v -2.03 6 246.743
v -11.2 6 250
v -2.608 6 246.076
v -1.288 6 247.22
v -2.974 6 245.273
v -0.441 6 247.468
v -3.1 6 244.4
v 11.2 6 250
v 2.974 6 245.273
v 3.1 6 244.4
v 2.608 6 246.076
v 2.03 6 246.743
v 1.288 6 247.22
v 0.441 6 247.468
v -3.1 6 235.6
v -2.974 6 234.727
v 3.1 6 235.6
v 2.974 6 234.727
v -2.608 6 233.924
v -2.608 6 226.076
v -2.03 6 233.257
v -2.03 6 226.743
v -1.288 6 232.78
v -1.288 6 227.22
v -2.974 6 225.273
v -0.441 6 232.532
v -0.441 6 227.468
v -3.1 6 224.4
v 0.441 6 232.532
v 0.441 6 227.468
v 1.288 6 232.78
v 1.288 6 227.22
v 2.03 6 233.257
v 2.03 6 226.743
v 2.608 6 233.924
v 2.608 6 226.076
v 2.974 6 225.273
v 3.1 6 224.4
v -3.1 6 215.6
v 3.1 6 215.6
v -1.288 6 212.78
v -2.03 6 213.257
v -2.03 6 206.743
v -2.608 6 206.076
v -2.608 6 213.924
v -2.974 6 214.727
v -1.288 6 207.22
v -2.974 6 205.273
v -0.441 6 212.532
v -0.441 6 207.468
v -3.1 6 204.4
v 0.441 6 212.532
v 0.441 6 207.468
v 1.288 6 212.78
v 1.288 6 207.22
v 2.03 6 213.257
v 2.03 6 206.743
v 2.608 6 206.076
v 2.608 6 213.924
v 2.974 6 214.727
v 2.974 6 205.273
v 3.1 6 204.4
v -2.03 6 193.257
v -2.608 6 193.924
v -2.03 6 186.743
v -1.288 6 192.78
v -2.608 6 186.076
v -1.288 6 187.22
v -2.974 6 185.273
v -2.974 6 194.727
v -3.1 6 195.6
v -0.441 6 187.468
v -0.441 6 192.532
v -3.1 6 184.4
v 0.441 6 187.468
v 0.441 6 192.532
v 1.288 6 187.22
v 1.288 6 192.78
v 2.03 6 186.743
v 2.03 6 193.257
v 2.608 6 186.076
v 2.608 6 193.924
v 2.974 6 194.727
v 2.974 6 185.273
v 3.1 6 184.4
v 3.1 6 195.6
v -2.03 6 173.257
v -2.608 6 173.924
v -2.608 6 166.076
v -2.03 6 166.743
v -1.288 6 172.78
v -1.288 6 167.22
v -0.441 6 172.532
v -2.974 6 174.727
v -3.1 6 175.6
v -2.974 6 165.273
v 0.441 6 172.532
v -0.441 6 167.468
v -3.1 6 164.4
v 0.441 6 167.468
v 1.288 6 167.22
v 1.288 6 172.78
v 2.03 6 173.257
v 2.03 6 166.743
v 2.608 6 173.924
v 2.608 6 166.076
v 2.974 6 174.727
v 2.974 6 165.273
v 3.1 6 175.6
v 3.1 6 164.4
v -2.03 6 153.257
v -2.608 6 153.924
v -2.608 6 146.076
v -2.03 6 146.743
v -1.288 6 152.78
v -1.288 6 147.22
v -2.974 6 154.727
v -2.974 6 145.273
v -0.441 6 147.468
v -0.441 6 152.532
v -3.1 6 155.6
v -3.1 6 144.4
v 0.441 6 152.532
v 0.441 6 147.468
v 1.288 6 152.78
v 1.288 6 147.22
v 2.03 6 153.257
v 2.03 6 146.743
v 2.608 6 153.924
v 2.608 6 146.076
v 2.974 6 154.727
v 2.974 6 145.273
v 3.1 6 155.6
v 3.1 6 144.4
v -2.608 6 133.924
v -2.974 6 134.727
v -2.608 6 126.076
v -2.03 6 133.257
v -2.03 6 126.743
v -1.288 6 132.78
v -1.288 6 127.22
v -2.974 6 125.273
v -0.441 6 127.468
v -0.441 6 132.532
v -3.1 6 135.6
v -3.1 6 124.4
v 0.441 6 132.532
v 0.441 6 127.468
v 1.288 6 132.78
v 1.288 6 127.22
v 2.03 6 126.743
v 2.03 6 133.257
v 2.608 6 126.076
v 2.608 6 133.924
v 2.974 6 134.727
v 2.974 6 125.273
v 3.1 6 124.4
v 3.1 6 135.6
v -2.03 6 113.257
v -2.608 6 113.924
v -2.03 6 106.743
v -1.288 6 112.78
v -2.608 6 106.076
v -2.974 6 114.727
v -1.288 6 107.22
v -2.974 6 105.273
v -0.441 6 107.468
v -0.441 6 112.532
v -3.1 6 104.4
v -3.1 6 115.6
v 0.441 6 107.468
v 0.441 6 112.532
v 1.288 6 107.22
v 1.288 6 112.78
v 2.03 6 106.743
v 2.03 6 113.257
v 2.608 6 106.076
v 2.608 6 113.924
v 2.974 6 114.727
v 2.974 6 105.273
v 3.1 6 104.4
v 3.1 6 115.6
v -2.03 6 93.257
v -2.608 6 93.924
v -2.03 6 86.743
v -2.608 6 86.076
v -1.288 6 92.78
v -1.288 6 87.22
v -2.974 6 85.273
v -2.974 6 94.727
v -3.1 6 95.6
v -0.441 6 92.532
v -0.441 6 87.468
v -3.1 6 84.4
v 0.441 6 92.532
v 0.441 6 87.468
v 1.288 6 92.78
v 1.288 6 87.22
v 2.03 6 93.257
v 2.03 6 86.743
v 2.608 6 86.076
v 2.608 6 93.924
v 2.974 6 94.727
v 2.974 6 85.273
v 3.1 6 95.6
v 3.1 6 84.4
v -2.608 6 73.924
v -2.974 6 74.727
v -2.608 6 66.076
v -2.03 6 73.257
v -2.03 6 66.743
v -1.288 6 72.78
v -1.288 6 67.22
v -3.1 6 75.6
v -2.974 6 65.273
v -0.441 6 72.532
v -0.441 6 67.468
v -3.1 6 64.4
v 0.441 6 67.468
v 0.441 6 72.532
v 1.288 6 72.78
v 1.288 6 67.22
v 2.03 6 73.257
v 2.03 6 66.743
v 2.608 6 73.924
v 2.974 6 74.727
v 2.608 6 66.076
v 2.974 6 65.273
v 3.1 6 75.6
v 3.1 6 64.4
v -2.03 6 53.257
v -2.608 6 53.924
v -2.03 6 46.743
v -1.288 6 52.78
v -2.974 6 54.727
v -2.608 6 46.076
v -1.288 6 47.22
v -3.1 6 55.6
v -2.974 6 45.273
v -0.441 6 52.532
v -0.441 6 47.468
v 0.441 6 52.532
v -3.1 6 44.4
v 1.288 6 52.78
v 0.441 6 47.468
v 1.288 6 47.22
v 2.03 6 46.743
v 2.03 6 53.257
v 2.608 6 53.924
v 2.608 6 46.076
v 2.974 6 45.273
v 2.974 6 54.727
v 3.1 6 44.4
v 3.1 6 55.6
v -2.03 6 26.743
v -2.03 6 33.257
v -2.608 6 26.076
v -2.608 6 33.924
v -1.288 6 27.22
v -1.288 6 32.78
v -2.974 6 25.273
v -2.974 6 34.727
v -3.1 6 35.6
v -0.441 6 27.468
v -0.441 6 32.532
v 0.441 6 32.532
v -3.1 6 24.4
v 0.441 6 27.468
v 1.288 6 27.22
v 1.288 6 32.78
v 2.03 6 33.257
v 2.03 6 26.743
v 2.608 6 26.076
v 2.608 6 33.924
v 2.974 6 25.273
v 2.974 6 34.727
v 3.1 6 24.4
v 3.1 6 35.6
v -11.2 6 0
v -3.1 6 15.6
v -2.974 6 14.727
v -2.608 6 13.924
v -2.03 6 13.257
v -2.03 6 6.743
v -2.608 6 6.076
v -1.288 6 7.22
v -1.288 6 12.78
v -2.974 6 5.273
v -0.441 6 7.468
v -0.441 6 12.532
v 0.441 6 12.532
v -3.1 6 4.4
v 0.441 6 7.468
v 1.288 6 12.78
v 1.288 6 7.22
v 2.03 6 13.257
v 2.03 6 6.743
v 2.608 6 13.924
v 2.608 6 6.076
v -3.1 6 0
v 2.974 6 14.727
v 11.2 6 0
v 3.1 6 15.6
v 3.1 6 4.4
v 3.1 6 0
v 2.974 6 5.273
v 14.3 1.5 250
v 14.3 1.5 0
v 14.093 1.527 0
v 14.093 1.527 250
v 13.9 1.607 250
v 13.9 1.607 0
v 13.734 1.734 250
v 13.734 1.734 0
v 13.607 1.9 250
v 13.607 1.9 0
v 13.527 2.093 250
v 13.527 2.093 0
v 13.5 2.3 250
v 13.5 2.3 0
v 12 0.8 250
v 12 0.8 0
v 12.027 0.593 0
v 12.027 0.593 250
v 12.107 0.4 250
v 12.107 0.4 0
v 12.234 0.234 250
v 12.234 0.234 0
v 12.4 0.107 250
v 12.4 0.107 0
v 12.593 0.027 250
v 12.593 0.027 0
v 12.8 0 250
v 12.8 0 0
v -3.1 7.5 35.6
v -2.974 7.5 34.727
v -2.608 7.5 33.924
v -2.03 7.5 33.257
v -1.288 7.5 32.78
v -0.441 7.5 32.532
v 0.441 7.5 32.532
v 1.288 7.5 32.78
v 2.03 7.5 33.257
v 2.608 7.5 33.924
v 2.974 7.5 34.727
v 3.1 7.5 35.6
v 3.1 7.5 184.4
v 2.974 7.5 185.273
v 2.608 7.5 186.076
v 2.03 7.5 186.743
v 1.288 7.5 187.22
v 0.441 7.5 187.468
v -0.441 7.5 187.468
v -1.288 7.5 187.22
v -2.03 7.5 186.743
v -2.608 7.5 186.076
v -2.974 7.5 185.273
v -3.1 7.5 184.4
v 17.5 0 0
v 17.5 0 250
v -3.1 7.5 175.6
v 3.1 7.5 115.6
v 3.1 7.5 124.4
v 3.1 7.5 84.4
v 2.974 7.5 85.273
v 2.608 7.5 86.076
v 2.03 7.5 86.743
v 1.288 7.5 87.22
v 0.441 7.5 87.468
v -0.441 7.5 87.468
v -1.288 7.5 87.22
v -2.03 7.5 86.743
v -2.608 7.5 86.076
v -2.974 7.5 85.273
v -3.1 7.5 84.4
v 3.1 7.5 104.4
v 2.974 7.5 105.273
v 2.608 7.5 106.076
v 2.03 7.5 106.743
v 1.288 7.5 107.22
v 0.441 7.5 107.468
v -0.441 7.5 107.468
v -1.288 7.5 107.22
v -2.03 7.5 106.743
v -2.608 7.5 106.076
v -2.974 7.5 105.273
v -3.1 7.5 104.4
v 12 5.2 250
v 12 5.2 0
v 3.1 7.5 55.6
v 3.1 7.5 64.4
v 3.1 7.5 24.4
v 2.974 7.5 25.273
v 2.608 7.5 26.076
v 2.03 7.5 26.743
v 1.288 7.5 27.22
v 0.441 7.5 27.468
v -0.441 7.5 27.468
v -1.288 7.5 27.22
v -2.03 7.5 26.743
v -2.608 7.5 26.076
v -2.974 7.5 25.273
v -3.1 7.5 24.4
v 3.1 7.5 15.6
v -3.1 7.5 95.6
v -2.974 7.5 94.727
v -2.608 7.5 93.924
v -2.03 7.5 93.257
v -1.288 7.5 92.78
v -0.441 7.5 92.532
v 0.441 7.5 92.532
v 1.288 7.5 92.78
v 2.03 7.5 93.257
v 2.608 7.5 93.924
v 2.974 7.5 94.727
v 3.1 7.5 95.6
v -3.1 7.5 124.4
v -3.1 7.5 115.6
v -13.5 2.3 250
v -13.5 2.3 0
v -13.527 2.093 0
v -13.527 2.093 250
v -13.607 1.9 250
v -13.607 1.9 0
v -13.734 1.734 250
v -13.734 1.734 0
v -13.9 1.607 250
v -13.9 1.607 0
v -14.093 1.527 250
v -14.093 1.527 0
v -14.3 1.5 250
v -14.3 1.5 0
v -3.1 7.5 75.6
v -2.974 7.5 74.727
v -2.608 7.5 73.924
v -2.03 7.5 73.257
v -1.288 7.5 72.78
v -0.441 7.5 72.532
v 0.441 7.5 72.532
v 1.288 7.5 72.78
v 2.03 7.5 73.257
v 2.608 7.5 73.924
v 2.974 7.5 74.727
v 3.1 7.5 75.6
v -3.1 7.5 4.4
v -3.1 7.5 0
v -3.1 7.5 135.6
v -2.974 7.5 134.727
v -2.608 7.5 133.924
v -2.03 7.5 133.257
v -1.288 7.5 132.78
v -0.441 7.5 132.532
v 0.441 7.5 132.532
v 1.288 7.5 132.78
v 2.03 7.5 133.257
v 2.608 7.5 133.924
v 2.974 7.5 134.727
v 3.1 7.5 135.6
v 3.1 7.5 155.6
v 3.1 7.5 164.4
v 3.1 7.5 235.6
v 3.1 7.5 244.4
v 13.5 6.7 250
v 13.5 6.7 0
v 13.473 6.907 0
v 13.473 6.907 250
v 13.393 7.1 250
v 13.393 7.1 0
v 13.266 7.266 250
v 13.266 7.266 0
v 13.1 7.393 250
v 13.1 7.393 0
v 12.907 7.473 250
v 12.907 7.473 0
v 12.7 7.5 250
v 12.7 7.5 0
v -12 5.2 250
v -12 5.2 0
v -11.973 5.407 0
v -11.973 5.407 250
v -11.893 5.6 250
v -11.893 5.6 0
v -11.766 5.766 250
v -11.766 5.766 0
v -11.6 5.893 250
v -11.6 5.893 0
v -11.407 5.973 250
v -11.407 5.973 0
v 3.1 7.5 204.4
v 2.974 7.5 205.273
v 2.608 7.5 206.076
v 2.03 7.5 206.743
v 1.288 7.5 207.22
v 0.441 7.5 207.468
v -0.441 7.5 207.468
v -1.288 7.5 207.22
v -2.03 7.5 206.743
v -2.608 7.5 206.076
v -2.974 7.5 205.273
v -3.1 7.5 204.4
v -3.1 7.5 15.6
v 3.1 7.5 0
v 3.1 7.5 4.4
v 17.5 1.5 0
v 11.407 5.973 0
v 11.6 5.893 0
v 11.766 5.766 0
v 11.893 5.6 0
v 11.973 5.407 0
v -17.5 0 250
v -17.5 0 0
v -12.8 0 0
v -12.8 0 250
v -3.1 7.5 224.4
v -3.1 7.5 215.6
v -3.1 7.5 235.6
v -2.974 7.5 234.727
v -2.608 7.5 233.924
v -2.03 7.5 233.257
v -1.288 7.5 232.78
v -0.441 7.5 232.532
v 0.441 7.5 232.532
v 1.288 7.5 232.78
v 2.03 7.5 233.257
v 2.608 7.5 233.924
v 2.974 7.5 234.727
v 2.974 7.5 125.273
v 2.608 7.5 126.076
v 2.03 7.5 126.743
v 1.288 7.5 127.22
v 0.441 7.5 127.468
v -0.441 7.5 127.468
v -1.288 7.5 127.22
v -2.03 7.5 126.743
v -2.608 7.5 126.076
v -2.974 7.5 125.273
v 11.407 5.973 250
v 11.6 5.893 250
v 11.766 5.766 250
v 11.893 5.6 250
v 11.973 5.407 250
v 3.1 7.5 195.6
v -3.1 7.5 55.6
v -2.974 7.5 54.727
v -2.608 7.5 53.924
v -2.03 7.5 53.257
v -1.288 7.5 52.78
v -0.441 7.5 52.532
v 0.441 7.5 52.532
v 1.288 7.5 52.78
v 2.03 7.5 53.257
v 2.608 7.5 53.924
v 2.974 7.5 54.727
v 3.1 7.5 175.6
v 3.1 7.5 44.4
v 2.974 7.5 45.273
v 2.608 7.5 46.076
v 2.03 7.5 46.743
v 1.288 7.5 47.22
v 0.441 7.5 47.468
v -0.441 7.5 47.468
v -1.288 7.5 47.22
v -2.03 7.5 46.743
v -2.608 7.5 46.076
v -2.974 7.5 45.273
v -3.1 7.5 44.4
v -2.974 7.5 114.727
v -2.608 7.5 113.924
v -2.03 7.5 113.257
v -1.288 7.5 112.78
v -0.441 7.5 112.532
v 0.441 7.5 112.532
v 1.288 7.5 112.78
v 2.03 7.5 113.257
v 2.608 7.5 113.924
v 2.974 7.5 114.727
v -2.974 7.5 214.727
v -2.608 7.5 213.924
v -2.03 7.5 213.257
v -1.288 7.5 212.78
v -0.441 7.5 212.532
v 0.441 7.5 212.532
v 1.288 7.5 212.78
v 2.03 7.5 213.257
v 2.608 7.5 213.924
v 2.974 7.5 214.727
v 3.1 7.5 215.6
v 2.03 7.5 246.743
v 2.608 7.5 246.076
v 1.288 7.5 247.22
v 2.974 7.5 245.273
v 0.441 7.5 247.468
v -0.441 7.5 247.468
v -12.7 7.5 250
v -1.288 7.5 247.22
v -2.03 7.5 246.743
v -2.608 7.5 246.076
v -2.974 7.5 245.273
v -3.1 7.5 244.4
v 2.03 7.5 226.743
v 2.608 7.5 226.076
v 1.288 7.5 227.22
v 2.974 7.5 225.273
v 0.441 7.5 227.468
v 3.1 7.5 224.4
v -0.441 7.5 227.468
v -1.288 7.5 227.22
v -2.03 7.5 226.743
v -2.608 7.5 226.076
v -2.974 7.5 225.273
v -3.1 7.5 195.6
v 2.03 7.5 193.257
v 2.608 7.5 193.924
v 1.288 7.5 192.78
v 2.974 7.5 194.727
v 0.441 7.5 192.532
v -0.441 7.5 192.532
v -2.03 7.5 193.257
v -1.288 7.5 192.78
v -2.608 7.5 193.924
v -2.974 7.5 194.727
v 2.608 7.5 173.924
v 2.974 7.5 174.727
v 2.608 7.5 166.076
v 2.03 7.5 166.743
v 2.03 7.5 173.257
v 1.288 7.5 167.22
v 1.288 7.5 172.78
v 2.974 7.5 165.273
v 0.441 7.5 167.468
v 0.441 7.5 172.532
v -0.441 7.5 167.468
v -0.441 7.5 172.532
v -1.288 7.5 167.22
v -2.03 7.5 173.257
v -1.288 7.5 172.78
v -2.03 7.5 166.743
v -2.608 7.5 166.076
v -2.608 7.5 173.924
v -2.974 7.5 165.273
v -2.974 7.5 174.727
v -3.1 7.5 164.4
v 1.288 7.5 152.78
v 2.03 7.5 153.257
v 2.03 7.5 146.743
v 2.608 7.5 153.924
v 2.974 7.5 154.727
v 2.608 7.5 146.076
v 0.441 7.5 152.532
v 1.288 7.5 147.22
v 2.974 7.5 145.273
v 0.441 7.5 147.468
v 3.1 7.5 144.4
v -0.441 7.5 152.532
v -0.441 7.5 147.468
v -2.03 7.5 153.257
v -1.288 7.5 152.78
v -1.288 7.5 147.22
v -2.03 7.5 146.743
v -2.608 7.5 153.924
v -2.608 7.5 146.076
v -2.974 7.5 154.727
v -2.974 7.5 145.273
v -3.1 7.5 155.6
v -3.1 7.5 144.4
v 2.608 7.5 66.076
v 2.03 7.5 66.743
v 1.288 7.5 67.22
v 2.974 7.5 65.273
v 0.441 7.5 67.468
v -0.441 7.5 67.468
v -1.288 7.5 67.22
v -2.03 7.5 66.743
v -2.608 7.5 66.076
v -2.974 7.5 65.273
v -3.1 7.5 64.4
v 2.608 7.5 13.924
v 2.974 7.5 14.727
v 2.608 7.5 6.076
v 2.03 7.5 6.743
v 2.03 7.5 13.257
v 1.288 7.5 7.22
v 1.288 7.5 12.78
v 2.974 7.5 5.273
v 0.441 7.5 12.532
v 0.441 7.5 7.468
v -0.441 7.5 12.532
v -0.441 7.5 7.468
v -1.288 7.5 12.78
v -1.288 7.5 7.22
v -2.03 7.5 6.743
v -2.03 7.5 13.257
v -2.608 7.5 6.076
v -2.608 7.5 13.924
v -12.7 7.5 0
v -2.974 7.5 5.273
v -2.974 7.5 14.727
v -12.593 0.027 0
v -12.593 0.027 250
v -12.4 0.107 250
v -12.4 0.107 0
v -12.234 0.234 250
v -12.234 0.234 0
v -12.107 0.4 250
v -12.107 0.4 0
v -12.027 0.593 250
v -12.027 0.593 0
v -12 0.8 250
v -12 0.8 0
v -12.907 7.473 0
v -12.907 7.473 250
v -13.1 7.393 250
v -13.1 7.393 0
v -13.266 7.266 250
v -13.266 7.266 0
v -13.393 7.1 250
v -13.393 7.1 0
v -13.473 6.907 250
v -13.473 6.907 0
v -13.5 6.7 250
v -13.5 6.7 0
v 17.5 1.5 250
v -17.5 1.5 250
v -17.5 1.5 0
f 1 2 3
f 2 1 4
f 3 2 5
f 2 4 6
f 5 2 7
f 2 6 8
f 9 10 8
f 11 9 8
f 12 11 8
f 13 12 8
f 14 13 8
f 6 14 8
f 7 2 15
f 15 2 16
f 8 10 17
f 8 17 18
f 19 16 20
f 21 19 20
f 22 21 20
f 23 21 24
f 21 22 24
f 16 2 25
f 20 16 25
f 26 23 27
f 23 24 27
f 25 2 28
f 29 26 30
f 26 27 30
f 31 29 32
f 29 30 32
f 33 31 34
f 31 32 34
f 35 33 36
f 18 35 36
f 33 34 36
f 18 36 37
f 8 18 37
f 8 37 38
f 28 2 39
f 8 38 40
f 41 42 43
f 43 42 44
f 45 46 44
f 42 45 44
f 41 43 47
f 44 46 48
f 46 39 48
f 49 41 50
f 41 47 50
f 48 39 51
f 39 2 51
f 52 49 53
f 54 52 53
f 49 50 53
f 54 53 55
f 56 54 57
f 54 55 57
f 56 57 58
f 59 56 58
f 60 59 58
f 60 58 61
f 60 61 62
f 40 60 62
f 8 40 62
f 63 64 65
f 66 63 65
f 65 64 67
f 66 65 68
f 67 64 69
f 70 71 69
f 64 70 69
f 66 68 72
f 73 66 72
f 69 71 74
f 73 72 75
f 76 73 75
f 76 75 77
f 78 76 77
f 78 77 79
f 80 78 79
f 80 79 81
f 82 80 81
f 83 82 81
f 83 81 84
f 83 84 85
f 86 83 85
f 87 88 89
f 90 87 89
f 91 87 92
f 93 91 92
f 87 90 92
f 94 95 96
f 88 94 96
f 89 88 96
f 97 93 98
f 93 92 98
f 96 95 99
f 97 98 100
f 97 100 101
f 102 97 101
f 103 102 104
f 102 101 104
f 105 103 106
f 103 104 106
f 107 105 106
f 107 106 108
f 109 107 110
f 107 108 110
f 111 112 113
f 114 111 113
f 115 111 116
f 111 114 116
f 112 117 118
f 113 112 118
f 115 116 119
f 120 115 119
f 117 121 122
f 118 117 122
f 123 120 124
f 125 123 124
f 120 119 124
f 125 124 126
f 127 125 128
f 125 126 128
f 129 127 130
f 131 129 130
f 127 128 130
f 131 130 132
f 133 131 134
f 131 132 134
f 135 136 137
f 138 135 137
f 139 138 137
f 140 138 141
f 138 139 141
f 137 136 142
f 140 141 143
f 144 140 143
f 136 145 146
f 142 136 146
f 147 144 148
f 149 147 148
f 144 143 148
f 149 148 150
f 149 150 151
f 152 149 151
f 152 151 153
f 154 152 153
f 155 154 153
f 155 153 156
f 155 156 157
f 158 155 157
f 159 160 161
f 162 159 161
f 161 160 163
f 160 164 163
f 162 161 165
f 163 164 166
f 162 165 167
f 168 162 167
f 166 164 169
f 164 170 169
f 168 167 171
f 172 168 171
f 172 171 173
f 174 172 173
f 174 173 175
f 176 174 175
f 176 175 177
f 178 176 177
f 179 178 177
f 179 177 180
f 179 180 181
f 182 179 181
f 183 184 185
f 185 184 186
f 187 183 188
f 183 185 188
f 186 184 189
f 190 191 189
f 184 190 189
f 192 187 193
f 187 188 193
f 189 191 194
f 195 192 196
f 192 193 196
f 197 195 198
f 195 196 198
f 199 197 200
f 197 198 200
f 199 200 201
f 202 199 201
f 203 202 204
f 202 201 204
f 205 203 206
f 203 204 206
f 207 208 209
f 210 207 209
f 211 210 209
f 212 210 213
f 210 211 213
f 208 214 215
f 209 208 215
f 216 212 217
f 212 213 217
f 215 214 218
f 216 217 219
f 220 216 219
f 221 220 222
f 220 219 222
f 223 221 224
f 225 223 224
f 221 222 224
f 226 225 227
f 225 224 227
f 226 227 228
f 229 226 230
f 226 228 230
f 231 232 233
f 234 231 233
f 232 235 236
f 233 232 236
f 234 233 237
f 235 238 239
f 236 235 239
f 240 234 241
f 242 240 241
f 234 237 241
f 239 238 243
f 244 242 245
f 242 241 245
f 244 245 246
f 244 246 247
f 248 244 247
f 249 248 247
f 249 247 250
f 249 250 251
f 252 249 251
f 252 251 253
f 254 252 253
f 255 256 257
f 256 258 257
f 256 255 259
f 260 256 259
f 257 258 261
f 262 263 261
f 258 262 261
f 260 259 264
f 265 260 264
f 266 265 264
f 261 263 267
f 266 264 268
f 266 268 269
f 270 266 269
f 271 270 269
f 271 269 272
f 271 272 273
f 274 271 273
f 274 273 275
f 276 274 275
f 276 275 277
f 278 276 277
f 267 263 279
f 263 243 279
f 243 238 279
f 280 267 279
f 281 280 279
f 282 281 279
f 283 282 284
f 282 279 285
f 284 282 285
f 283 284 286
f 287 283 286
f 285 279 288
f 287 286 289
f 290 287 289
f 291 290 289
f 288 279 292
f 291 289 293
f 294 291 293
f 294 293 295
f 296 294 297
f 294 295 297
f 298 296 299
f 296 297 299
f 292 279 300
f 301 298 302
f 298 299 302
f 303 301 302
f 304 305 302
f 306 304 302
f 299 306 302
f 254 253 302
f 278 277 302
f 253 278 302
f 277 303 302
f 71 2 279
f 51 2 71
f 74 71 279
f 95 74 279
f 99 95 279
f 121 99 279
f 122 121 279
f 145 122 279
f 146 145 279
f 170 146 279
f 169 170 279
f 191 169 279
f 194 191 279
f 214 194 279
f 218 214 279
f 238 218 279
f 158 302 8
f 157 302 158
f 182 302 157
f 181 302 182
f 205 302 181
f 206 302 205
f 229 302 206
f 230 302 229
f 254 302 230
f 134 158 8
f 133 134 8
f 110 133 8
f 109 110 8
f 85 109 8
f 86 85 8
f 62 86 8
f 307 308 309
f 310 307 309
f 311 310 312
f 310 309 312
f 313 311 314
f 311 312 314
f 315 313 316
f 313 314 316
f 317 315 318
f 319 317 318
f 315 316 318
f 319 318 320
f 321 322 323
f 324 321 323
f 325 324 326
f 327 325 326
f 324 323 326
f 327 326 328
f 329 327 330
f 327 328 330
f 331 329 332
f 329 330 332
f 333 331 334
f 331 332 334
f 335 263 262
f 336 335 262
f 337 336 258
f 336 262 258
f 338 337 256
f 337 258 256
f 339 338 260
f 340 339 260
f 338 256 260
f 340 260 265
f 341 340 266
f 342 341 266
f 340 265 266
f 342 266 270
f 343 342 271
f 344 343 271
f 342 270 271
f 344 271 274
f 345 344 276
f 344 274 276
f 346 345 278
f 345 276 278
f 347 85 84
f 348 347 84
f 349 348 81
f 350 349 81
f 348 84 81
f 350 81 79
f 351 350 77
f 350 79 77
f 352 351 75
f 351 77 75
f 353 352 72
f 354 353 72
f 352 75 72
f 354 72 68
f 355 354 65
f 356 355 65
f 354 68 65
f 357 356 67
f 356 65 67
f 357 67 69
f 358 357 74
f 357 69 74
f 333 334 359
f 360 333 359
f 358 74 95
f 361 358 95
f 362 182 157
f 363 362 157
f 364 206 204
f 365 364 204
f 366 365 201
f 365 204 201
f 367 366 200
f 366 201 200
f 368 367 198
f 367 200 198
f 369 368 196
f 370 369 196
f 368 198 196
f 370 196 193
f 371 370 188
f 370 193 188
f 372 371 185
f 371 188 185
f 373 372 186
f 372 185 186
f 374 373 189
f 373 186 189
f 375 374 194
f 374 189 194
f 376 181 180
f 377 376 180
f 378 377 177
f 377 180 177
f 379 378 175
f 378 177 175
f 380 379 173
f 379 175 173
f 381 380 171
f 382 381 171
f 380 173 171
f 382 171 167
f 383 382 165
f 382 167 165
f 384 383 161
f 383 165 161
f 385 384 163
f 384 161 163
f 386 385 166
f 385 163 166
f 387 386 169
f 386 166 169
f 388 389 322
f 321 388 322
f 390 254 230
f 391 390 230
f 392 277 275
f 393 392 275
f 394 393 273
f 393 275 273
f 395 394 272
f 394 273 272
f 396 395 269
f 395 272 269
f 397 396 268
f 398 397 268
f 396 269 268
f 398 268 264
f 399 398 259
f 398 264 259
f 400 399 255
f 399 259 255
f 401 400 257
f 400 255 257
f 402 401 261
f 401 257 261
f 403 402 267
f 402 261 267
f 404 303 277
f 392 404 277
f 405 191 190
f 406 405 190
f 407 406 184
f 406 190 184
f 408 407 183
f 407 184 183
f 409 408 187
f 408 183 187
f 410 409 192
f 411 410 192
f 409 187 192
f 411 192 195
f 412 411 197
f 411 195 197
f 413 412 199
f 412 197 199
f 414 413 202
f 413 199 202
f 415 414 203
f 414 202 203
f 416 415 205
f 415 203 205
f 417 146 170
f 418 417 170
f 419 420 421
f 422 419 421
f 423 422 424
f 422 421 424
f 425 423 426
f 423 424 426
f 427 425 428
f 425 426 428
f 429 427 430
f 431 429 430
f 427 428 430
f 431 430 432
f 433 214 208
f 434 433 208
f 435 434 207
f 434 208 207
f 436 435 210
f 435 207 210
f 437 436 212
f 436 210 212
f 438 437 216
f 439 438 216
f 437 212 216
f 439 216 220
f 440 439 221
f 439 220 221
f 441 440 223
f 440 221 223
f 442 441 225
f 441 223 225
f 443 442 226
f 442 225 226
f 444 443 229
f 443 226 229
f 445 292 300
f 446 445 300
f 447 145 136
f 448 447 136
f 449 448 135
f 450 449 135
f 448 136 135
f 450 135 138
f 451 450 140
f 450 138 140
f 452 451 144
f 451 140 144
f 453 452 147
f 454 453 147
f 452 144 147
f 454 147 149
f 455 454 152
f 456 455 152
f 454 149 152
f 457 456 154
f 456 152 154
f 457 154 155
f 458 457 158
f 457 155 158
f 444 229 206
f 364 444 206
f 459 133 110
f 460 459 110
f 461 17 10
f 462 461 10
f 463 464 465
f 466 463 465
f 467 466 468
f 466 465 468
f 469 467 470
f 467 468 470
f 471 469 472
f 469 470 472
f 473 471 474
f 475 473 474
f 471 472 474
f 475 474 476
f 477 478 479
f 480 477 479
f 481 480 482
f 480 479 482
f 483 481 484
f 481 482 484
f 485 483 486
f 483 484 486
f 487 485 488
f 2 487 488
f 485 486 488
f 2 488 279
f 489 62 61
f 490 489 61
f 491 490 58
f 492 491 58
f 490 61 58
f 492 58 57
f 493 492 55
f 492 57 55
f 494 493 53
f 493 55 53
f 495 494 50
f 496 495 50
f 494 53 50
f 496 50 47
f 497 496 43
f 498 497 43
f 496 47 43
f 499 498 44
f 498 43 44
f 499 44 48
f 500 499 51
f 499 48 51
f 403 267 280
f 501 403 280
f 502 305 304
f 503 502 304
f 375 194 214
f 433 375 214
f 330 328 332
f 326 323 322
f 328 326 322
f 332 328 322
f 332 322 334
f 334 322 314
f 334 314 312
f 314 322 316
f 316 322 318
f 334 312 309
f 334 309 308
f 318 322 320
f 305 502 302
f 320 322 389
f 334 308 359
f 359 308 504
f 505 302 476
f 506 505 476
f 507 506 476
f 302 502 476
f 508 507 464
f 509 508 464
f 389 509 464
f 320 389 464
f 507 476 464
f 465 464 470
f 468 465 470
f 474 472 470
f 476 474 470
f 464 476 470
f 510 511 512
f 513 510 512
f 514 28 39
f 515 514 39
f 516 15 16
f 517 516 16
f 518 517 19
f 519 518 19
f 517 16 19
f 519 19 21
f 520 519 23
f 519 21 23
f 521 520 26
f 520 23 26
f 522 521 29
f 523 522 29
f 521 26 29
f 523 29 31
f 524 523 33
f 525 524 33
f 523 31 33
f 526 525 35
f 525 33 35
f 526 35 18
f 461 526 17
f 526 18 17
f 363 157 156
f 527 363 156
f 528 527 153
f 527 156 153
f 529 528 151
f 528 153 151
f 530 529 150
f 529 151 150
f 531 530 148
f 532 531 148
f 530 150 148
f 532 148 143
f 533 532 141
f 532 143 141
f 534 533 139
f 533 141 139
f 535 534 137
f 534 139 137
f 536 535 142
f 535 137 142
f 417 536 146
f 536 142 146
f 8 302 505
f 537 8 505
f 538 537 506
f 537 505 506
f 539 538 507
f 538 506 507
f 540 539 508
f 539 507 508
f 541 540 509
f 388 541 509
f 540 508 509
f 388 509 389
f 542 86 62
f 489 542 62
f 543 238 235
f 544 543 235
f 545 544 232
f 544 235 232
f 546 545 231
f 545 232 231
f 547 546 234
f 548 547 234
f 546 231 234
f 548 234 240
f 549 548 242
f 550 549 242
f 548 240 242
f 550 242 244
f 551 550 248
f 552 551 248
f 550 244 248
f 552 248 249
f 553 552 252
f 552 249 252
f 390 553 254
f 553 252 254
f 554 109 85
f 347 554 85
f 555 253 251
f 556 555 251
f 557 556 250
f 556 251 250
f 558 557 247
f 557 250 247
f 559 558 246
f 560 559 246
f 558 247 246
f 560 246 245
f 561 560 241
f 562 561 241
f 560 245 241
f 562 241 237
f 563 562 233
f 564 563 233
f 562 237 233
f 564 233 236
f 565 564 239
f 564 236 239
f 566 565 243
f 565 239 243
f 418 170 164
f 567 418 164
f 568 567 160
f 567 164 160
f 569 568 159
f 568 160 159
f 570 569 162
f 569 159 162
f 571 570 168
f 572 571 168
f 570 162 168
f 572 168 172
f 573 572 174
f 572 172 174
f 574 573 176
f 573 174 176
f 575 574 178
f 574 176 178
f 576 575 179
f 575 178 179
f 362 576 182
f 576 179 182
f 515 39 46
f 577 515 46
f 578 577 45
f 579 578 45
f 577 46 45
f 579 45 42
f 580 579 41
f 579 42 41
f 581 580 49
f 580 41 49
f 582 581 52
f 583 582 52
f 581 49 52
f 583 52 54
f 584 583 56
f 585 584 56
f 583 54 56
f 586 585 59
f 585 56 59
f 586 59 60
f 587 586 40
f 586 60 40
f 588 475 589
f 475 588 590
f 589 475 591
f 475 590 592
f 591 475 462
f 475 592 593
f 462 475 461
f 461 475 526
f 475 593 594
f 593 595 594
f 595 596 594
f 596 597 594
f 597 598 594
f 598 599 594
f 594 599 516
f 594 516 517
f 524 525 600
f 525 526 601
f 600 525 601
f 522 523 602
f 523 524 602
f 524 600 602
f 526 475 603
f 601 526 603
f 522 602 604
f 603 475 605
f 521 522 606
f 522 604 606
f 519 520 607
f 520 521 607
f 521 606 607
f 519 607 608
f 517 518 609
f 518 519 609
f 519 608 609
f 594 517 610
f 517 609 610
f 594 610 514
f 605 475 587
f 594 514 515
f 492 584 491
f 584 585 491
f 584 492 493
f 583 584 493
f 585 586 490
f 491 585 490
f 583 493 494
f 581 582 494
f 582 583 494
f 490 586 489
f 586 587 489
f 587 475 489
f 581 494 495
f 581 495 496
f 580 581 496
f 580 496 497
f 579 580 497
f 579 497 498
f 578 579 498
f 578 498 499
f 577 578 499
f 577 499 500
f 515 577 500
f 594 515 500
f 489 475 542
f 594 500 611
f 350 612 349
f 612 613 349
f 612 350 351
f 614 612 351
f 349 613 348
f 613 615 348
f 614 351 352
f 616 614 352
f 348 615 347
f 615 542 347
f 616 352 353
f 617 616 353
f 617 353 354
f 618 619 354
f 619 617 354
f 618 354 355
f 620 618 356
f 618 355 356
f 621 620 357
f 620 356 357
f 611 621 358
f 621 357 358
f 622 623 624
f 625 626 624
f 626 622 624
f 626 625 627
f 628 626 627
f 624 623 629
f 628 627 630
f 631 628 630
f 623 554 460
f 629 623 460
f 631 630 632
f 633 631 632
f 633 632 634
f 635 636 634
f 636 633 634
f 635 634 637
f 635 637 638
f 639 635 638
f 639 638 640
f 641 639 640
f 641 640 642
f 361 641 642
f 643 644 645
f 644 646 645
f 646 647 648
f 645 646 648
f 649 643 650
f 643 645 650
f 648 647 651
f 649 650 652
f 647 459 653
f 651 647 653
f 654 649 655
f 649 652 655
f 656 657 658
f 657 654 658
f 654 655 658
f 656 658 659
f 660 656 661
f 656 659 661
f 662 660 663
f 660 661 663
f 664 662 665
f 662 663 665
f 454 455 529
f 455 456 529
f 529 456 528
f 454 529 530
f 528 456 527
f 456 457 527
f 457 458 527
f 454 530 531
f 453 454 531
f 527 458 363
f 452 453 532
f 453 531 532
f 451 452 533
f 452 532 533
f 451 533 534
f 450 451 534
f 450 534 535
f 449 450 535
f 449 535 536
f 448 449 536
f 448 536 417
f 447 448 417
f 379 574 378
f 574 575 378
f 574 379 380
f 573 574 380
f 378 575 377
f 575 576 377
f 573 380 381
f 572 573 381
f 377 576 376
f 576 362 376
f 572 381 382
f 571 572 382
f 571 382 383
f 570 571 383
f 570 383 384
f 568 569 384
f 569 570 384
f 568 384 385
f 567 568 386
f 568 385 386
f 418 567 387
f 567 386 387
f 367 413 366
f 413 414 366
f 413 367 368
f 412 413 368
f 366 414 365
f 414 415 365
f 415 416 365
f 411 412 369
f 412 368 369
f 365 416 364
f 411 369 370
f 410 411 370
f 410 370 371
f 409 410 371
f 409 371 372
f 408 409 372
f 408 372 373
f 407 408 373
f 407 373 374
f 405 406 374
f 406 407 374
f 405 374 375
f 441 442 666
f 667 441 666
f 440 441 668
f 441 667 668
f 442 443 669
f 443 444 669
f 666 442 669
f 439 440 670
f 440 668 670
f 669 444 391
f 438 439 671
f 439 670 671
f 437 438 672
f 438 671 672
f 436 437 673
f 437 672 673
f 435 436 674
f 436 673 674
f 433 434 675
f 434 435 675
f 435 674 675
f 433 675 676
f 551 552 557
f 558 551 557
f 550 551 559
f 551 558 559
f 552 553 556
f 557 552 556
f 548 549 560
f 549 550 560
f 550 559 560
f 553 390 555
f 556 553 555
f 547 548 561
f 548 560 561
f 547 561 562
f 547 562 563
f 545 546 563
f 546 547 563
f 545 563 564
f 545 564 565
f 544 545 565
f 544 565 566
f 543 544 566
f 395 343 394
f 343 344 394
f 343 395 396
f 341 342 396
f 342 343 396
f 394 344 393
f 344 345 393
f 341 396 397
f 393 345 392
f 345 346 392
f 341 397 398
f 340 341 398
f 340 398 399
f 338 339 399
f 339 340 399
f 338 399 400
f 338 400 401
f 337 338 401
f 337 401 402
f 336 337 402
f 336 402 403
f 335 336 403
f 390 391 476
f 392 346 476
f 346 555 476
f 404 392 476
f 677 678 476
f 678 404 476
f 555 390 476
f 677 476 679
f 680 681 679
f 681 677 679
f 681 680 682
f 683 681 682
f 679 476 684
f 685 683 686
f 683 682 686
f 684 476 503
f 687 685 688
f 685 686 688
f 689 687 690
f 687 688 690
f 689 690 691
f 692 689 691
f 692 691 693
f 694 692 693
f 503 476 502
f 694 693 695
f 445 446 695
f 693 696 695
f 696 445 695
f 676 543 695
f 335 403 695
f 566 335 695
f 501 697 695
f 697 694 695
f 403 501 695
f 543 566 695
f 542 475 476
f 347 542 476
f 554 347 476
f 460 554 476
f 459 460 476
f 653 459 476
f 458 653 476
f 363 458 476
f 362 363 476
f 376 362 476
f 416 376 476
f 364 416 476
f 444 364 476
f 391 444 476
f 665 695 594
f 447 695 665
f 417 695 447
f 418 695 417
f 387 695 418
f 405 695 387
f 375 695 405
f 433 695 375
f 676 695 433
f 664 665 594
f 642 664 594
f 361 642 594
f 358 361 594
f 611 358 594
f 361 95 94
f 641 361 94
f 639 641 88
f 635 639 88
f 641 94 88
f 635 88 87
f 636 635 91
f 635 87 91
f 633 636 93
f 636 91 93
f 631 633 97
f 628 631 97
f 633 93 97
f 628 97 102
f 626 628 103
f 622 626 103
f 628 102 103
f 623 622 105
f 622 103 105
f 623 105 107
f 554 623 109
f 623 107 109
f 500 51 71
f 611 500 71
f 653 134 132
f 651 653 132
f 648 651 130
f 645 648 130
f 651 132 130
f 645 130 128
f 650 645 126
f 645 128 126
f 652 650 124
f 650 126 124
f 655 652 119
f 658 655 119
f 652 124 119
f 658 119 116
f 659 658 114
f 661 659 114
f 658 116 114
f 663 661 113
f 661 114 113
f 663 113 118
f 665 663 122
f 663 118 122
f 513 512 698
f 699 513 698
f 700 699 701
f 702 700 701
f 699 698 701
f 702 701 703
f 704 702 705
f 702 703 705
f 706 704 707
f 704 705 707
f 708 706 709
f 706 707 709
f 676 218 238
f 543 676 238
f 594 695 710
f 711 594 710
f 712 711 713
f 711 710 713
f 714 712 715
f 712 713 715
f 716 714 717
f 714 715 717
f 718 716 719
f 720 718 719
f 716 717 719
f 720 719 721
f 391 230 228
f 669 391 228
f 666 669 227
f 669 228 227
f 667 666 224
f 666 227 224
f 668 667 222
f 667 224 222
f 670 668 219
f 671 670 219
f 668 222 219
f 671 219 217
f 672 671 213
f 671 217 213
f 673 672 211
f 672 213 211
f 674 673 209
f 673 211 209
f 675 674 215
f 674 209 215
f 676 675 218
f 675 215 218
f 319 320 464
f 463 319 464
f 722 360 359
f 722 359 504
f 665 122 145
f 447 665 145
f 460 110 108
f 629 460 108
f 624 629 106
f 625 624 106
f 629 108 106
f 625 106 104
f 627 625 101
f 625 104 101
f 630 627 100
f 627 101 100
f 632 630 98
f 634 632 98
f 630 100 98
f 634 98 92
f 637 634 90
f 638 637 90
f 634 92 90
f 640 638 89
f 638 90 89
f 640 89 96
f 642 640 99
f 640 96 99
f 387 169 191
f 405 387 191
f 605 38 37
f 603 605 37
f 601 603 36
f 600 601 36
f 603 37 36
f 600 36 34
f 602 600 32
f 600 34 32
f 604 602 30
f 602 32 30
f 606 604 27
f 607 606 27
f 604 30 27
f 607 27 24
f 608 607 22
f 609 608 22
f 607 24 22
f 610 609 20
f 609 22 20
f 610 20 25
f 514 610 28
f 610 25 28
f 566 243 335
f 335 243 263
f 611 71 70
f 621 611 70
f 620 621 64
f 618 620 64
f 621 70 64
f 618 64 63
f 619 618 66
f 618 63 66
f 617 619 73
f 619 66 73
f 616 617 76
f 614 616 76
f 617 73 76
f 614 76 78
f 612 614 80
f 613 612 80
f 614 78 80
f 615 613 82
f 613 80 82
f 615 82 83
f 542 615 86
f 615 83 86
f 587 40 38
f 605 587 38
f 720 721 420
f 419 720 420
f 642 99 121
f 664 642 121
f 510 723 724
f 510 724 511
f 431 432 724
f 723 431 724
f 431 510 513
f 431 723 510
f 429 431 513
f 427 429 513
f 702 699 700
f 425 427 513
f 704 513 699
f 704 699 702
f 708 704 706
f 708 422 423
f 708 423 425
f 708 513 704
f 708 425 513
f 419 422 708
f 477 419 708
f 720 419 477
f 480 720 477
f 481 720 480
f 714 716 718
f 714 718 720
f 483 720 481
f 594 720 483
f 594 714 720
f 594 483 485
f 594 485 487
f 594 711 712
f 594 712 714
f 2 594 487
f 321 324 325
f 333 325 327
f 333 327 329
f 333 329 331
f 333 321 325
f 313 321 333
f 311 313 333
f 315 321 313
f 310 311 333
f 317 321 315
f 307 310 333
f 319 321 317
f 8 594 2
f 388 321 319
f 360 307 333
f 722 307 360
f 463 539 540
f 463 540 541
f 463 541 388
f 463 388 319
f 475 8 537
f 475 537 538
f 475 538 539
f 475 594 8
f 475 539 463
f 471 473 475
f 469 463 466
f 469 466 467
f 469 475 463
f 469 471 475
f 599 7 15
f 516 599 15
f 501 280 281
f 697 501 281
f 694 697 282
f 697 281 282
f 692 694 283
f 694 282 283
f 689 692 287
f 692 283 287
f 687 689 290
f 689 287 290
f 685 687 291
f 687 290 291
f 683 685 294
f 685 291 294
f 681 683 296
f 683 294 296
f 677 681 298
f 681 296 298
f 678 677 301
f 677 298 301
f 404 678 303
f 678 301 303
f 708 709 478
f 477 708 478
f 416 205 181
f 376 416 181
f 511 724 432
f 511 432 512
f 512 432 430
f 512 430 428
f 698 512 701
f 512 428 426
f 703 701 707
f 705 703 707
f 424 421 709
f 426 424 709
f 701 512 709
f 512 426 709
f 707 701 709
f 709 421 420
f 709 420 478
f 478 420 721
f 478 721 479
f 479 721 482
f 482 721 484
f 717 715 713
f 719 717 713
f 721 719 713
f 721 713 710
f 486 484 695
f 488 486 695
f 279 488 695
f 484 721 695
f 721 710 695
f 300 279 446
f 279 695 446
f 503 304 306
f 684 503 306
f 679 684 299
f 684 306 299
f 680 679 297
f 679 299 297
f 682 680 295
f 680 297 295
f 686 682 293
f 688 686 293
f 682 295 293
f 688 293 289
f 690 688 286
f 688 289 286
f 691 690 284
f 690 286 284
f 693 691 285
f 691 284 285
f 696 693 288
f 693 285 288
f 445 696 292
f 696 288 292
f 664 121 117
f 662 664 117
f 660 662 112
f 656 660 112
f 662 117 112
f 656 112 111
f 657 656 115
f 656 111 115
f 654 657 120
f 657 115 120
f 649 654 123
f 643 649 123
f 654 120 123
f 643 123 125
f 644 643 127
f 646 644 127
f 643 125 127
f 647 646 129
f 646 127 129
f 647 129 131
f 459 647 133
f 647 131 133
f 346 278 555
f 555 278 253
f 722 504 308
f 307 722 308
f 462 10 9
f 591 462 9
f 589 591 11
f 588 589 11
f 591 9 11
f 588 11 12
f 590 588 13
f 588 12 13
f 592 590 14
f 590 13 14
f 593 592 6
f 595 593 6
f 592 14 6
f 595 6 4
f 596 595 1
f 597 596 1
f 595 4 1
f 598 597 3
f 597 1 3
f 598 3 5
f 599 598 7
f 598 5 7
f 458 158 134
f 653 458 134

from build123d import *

# Parameters (mm, degrees)
EXTRUDE_1_DEPTH     = 250
CUT_EXTRUDE_2_DEPTH = 7.5


with BuildPart() as part:
    # 草图1 → 凸台-拉伸1 (new body)
    with BuildSketch(Plane.XY):
        with BuildLine():
            Line((-17.5, 0), (-12.8, 0))
            ThreePointArc((-12.8, 0), (-12.234314575, 0.234314575), (-12, 0.8))
            Line((-12, 0.8), (-12, 5.2))
            ThreePointArc((-12, 5.2), (-11.765685425, 5.765685425), (-11.2, 6))
            Line((-11.2, 6), (11.2, 6))
            ThreePointArc((11.2, 6), (11.765685425, 5.765685425), (12, 5.2))
            Line((12, 5.2), (12, 0.8))
            ThreePointArc((12, 0.8), (12.234314575, 0.234314575), (12.8, 0))
            Line((12.8, 0), (17.5, 0))
            Line((17.5, 0), (17.5, 1.5))
            Line((17.5, 1.5), (14.3, 1.5))
            ThreePointArc((14.3, 1.5), (13.734314575, 1.734314575), (13.5, 2.3))
            Line((13.5, 2.3), (13.5, 6.7))
            ThreePointArc((13.5, 6.7), (13.265685425, 7.265685425), (12.7, 7.5))
            Line((12.7, 7.5), (-12.7, 7.5))
            ThreePointArc((-12.7, 7.5), (-13.265685425, 7.265685425), (-13.5, 6.7))
            Line((-13.5, 6.7), (-13.5, 2.3))
            ThreePointArc((-13.5, 2.3), (-13.734314575, 1.734314575), (-14.3, 1.5))
            Line((-14.3, 1.5), (-17.5, 1.5))
            Line((-17.5, 1.5), (-17.5, 0))
        make_face()
    extrude(amount=EXTRUDE_1_DEPTH)

    # 草图2 → 切除-拉伸2 (cut)
    with BuildSketch(Plane(origin=(0, 0, 0), x_dir=(1, 0, 0), z_dir=(0, 1, 0))):
        with BuildLine():
            Line((3.1, 4.4), (3.1, -4.4))
            ThreePointArc((3.1, -4.4), (0, -7.5), (-3.1, -4.4))
            Line((-3.1, -4.4), (-3.1, 4.4))
            ThreePointArc((-3.1, 4.4), (0, 7.5), (3.1, 4.4))
        make_face()
        with BuildLine():
            Line((3.1, -15.6), (3.1, -24.4))
            ThreePointArc((3.1, -24.4), (0, -27.5), (-3.1, -24.4))
            Line((-3.1, -24.4), (-3.1, -15.6))
            ThreePointArc((-3.1, -15.6), (0, -12.5), (3.1, -15.6))
        make_face()
        with BuildLine():
            Line((3.1, -35.6), (3.1, -44.4))
            ThreePointArc((3.1, -44.4), (0, -47.5), (-3.1, -44.4))
            Line((-3.1, -44.4), (-3.1, -35.6))
            ThreePointArc((-3.1, -35.6), (0, -32.5), (3.1, -35.6))
        make_face()
        with BuildLine():
            Line((3.1, -55.6), (3.1, -64.4))
            ThreePointArc((3.1, -64.4), (0, -67.5), (-3.1, -64.4))
            Line((-3.1, -64.4), (-3.1, -55.6))
            ThreePointArc((-3.1, -55.6), (0, -52.5), (3.1, -55.6))
        make_face()
        with BuildLine():
            Line((3.1, -75.6), (3.1, -84.4))
            ThreePointArc((3.1, -84.4), (0, -87.5), (-3.1, -84.4))
            Line((-3.1, -84.4), (-3.1, -75.6))
            ThreePointArc((-3.1, -75.6), (0, -72.5), (3.1, -75.6))
        make_face()
        with BuildLine():
            Line((3.1, -95.6), (3.1, -104.4))
            ThreePointArc((3.1, -104.4), (0, -107.5), (-3.1, -104.4))
            Line((-3.1, -104.4), (-3.1, -95.6))
            ThreePointArc((-3.1, -95.6), (0, -92.5), (3.1, -95.6))
        make_face()
        with BuildLine():
            Line((3.1, -115.6), (3.1, -124.4))
            ThreePointArc((3.1, -124.4), (0, -127.5), (-3.1, -124.4))
            Line((-3.1, -124.4), (-3.1, -115.6))
            ThreePointArc((-3.1, -115.6), (0, -112.5), (3.1, -115.6))
        make_face()
        with BuildLine():
            Line((3.1, -135.6), (3.1, -144.4))
            ThreePointArc((3.1, -144.4), (0, -147.5), (-3.1, -144.4))
            Line((-3.1, -144.4), (-3.1, -135.6))
            ThreePointArc((-3.1, -135.6), (0, -132.5), (3.1, -135.6))
        make_face()
        with BuildLine():
            Line((3.1, -155.6), (3.1, -164.4))
            ThreePointArc((3.1, -164.4), (0, -167.5), (-3.1, -164.4))
            Line((-3.1, -164.4), (-3.1, -155.6))
            ThreePointArc((-3.1, -155.6), (0, -152.5), (3.1, -155.6))
        make_face()
        with BuildLine():
            Line((3.1, -175.6), (3.1, -184.4))
            ThreePointArc((3.1, -184.4), (0, -187.5), (-3.1, -184.4))
            Line((-3.1, -184.4), (-3.1, -175.6))
            ThreePointArc((-3.1, -175.6), (0, -172.5), (3.1, -175.6))
        make_face()
        with BuildLine():
            Line((3.1, -195.6), (3.1, -204.4))
            ThreePointArc((3.1, -204.4), (0, -207.5), (-3.1, -204.4))
            Line((-3.1, -204.4), (-3.1, -195.6))
            ThreePointArc((-3.1, -195.6), (0, -192.5), (3.1, -195.6))
        make_face()
        with BuildLine():
            Line((3.1, -215.6), (3.1, -224.4))
            ThreePointArc((3.1, -224.4), (0, -227.5), (-3.1, -224.4))
            Line((-3.1, -224.4), (-3.1, -215.6))
            ThreePointArc((-3.1, -215.6), (0, -212.5), (3.1, -215.6))
        make_face()
        with BuildLine():
            Line((3.1, -235.6), (3.1, -244.4))
            ThreePointArc((3.1, -244.4), (0, -247.5), (-3.1, -244.4))
            Line((-3.1, -244.4), (-3.1, -235.6))
            ThreePointArc((-3.1, -235.6), (0, -232.5), (3.1, -235.6))
        make_face()
    extrude(amount=CUT_EXTRUDE_2_DEPTH, mode=Mode.SUBTRACT)


solid = part.part
